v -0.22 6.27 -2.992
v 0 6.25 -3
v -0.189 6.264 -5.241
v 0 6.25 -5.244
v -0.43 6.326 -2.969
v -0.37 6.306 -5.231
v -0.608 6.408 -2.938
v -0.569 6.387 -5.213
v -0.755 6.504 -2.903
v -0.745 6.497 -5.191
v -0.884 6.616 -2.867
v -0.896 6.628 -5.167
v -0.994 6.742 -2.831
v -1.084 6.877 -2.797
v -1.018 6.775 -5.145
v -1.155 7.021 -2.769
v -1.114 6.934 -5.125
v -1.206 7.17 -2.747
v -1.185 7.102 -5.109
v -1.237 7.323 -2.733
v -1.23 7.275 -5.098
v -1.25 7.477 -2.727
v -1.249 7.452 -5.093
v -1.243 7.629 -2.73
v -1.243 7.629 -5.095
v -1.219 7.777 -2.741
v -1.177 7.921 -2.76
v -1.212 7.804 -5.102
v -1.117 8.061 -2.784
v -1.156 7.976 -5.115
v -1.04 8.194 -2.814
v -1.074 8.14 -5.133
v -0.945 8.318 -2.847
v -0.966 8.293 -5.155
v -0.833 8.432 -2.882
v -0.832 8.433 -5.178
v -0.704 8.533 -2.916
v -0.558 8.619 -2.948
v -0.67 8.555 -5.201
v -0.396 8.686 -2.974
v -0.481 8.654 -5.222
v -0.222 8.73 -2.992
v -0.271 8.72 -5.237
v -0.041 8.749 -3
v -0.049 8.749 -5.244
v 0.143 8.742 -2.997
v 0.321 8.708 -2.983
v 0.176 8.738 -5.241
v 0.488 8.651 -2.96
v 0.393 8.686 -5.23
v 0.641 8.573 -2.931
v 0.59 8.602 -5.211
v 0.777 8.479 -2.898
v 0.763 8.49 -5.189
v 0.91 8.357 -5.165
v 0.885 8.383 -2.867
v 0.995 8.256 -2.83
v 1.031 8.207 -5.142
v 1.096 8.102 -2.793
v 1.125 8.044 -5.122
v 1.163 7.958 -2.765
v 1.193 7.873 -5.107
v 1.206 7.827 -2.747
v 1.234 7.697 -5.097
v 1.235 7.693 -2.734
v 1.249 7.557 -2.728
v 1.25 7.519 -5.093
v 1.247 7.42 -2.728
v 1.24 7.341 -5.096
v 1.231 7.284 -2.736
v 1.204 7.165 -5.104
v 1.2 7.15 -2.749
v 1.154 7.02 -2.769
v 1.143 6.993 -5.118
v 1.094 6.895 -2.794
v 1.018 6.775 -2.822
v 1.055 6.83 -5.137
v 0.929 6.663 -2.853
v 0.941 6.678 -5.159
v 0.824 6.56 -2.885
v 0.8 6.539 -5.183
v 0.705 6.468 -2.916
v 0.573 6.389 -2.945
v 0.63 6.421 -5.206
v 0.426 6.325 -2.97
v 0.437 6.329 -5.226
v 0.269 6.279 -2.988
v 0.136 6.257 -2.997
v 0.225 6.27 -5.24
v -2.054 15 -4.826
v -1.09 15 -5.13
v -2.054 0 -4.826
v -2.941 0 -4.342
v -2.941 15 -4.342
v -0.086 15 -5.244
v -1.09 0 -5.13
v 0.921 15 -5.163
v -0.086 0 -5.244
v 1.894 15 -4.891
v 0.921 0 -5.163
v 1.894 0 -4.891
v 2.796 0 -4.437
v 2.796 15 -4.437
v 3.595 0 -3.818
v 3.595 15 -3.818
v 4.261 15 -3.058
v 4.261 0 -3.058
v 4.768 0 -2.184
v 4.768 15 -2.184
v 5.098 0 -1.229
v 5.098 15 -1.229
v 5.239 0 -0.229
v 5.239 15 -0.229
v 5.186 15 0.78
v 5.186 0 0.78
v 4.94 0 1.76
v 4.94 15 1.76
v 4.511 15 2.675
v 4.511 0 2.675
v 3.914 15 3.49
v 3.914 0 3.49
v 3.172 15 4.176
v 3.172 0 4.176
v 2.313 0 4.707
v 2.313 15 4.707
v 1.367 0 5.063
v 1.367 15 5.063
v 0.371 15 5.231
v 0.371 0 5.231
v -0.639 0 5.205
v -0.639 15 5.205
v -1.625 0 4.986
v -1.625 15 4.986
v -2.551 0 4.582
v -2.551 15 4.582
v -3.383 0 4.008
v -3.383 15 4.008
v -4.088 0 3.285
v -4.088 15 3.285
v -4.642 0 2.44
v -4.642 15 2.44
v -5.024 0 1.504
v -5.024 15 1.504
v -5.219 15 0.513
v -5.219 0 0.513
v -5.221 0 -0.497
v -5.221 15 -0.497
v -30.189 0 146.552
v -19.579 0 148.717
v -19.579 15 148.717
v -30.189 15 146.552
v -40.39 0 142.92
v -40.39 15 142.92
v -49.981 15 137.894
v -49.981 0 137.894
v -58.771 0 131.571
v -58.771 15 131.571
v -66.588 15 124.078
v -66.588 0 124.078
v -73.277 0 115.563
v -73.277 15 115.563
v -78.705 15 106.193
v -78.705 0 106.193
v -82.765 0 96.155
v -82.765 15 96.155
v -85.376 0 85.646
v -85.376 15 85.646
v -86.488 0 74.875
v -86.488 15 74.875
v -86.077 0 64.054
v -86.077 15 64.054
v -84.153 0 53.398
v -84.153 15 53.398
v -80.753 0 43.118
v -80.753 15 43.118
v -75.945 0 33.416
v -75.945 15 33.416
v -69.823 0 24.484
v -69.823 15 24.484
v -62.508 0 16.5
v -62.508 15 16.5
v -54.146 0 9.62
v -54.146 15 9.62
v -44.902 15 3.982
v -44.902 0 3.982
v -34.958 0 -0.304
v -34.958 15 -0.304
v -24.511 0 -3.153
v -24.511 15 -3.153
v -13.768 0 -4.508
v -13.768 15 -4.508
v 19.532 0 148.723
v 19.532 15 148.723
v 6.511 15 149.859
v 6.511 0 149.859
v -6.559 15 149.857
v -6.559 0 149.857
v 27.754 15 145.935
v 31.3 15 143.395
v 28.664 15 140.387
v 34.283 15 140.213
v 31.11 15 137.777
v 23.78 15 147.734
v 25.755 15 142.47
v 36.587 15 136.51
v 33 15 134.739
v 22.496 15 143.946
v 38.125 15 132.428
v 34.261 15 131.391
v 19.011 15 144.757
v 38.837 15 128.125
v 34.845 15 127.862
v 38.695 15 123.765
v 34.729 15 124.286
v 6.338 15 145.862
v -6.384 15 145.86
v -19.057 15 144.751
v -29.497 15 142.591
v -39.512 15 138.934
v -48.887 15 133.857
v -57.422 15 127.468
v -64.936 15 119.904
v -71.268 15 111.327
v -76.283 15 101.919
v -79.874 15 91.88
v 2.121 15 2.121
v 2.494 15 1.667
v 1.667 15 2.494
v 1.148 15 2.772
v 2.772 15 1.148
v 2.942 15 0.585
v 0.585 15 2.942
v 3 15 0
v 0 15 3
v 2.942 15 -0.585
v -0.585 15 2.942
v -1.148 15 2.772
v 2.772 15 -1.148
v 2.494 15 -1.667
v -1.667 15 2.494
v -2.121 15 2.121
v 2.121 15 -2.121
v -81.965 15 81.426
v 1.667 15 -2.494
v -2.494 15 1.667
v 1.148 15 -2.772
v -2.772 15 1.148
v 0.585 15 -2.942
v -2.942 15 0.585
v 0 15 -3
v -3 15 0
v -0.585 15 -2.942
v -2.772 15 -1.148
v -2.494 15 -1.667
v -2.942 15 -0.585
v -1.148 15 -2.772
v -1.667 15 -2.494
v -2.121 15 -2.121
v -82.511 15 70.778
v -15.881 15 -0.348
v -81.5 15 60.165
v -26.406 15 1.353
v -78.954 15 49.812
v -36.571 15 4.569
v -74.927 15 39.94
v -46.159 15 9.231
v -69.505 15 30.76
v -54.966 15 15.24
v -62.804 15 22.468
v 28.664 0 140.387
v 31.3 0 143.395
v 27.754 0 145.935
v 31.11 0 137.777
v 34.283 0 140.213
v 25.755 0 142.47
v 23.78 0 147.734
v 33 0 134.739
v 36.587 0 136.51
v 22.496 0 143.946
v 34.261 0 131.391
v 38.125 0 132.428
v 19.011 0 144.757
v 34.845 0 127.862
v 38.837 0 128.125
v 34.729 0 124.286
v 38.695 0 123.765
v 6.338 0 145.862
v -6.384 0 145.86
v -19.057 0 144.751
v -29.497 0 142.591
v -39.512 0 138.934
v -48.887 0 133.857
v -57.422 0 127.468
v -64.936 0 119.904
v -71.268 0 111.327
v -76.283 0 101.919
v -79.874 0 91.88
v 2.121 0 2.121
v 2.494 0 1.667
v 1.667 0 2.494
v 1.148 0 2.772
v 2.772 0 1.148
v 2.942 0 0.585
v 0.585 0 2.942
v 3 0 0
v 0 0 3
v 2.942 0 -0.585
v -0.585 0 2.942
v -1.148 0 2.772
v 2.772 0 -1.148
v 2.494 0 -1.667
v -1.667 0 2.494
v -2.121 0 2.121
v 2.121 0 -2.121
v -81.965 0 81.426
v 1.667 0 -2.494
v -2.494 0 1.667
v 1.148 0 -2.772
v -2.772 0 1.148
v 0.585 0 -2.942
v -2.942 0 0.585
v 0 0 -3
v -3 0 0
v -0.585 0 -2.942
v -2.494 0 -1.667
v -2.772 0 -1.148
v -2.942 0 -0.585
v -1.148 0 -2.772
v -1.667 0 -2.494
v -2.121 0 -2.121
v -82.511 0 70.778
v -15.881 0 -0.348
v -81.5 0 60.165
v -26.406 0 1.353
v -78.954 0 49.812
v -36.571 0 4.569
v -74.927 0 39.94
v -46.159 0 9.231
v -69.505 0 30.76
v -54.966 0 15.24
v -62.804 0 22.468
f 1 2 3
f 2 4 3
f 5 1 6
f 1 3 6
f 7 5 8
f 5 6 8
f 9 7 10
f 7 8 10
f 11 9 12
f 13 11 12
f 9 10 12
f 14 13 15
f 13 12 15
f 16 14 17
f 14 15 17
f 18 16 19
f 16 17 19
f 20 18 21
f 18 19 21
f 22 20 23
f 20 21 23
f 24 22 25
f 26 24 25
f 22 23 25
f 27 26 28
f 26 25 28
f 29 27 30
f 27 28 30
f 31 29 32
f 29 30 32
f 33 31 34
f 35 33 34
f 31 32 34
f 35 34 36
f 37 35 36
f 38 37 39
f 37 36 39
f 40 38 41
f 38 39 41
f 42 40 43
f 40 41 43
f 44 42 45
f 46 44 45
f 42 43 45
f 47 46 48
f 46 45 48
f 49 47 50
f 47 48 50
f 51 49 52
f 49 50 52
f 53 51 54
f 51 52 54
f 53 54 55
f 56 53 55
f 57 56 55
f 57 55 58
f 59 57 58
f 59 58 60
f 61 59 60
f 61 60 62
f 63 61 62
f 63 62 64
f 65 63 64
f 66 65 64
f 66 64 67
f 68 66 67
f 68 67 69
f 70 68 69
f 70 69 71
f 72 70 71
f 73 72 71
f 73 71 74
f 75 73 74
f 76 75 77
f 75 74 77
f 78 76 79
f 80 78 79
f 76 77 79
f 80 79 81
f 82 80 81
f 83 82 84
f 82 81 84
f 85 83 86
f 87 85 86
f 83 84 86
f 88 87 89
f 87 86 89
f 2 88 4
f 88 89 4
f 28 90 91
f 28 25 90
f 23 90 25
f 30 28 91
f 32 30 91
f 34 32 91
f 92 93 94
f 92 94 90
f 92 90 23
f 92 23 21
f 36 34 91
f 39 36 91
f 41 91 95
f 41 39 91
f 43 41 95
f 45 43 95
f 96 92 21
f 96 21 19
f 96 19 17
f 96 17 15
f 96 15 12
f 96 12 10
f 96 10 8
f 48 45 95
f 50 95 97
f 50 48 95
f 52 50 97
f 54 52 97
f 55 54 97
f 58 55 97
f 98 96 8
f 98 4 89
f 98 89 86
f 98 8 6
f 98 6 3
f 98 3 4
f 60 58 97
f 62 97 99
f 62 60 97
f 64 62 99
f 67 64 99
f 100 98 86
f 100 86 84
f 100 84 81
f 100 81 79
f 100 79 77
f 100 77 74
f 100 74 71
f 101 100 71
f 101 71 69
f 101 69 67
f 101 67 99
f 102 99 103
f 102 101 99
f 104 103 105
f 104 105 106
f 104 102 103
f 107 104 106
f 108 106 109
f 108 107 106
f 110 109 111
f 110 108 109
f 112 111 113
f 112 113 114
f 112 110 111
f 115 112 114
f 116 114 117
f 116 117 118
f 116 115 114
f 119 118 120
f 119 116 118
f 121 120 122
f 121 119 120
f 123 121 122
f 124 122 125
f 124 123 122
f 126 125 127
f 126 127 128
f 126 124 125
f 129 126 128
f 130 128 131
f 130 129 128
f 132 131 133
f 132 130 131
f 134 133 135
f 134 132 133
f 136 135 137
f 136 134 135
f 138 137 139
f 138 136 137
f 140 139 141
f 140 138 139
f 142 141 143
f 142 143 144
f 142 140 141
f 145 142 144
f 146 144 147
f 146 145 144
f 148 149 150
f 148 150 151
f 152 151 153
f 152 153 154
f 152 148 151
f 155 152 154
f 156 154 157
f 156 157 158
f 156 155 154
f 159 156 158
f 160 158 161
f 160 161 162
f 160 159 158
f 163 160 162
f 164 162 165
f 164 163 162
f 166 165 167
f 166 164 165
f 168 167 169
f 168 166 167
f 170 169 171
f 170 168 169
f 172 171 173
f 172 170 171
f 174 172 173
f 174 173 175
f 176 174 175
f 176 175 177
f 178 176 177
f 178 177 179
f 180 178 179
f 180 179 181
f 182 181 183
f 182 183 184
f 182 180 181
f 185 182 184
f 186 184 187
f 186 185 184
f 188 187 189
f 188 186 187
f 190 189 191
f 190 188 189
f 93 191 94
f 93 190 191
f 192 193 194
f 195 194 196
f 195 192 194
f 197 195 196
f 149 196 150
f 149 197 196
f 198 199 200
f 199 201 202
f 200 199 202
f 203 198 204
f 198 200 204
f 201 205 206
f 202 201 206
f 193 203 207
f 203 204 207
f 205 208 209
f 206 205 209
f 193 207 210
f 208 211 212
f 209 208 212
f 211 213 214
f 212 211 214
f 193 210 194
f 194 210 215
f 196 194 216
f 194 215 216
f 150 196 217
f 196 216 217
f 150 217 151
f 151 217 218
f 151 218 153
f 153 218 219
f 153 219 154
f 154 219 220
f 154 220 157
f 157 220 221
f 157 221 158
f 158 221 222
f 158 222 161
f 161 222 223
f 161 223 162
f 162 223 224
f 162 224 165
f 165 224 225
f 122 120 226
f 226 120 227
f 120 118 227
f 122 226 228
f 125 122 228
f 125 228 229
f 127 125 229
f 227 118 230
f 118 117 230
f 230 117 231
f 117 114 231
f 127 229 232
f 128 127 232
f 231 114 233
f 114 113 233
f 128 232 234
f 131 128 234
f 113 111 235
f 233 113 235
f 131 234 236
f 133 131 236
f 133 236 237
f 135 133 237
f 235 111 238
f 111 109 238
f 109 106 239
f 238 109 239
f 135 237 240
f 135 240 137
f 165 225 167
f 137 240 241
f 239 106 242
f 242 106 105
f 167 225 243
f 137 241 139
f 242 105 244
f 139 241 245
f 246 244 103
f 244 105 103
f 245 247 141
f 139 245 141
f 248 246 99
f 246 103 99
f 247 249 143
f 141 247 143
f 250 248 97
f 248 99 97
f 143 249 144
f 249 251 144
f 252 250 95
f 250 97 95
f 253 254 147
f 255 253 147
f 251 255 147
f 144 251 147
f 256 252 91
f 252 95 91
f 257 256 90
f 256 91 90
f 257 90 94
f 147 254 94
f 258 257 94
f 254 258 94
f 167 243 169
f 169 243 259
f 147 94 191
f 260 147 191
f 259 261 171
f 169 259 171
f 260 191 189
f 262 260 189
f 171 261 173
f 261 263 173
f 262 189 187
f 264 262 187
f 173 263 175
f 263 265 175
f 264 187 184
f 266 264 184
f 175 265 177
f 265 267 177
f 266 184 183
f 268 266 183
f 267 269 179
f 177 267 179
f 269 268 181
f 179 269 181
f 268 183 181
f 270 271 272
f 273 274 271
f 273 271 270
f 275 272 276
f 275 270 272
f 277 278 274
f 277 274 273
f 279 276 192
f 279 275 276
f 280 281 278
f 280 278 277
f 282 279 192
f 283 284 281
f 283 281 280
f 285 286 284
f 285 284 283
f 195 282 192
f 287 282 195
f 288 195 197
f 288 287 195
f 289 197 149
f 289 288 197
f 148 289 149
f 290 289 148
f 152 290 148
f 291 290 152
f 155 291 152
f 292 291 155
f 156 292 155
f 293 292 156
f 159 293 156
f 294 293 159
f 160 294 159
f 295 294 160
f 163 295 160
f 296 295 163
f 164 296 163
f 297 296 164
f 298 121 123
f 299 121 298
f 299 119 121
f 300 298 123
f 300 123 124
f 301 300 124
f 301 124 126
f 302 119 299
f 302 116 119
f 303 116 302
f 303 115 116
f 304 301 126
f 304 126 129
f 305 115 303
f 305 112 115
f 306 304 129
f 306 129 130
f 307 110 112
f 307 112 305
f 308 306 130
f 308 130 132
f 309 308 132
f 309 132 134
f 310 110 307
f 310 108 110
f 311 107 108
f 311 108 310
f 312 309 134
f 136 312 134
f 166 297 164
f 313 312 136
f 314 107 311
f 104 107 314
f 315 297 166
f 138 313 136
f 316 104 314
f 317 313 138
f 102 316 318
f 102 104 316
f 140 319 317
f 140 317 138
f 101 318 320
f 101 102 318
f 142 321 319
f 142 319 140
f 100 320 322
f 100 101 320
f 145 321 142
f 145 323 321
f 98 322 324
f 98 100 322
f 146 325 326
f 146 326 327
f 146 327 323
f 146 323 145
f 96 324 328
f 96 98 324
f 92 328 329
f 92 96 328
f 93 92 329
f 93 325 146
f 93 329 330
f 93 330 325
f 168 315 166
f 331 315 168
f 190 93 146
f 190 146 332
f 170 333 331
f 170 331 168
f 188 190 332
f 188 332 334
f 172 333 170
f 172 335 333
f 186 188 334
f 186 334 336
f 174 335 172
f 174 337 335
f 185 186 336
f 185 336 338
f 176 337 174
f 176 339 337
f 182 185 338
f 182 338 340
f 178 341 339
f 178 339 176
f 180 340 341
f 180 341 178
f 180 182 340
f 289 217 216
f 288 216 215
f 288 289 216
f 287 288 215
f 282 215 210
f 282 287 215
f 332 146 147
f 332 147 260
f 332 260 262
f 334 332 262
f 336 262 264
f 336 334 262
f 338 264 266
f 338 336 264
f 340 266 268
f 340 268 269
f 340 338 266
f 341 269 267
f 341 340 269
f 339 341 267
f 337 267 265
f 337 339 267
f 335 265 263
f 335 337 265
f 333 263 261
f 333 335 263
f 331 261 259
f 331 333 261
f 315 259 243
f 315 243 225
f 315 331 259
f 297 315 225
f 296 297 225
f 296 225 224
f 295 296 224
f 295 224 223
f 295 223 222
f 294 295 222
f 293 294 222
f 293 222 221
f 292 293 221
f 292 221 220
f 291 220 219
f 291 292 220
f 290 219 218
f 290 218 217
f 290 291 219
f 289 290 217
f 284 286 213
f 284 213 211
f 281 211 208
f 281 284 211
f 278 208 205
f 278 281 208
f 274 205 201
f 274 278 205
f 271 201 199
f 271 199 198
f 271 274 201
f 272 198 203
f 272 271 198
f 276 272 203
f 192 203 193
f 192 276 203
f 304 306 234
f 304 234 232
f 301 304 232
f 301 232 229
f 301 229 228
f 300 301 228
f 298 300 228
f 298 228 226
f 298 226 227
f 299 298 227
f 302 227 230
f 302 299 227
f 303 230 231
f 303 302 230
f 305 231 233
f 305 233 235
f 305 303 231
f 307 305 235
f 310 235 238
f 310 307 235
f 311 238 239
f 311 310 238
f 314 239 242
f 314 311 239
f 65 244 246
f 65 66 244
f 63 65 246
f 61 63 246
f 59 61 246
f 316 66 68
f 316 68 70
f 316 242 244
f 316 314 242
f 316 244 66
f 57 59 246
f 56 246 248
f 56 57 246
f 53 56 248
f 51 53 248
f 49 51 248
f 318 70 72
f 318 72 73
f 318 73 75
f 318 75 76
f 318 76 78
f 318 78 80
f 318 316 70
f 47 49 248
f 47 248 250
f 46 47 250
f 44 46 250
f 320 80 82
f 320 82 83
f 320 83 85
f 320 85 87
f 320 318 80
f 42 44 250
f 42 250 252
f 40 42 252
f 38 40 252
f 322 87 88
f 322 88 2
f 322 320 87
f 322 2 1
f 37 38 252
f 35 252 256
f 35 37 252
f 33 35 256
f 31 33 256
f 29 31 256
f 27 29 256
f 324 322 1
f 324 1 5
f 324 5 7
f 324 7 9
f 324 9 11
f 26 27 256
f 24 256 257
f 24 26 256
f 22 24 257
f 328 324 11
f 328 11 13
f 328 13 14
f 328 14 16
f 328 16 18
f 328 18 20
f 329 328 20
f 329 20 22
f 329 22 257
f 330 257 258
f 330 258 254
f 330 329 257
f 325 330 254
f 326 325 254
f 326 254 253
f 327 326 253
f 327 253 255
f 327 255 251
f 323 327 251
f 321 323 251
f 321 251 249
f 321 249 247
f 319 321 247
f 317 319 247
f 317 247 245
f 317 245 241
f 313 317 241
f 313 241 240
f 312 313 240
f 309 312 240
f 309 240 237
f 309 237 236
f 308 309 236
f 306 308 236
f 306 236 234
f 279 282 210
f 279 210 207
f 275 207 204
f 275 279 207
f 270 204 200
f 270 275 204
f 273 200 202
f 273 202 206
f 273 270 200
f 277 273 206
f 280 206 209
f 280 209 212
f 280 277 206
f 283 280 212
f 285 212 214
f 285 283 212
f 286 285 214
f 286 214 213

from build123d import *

# Parameters (mm, degrees)
ESQUISSE1_R        = 3
BOSS_EXTRU_3_DEPTH = 15
ESQUISSE7_W        = 1.25
ESQUISSE7_H        = 5.244372399


with BuildPart() as part:
    # Esquisse1 → Boss.-Extru.3 (new body)
    with BuildSketch(Plane(origin=(0, 0, 0), x_dir=(1, 0, 0), z_dir=(0, 1, 0))):
        with BuildLine():
            Line((34.729410673, -124.285932568), (38.695354514, -123.765078027))
            ThreePointArc((38.695354514, -123.765078027), (34.282632836, -140.212837317), (19.532045284, -148.722894024))
            ThreePointArc((19.532045284, -148.722894024), (-0.023643562, -149.999998137), (-19.578928833, -148.716729206))
            ThreePointArc((-19.578928833, -148.716729206), (-86.077469284, -64.054307062), (-2.940851082, 4.342215653))
            ThreePointArc((-2.940851082, 4.342215653), (4.510953097, -2.674835324), (-5.220739084, 0.49731808))
            ThreePointArc((-5.220739084, 0.49731808), (-82.19944379, -65.452964988), (-19.056824064, -144.750949761))
            ThreePointArc((-19.056824064, -144.750949761), (-0.023013067, -145.999998186), (19.011190743, -144.756950184))
            ThreePointArc((19.011190743, -144.756950184), (31.109987274, -137.776791312), (34.729410673, -124.285932568))
        make_face()
        with Locations(Location((0, 0, 0), (0, 0, 270))):
            Circle(ESQUISSE1_R, mode=Mode.SUBTRACT)
    extrude(amount=BOSS_EXTRU_3_DEPTH)

    # Esquisse7 → Trou taraudé M3x0.51 (revolve, cut)
    with BuildSketch(Plane(origin=(0, 7.5, 0), x_dir=(0, -1, 0), z_dir=(1, 0, 0))):
        with Locations((0.625, 2.6221862)):
            Rectangle(ESQUISSE7_W, ESQUISSE7_H)
    revolve(axis=Axis((0, 7.5, 6.35), (0, 0, -1)), mode=Mode.SUBTRACT)


solid = part.part
